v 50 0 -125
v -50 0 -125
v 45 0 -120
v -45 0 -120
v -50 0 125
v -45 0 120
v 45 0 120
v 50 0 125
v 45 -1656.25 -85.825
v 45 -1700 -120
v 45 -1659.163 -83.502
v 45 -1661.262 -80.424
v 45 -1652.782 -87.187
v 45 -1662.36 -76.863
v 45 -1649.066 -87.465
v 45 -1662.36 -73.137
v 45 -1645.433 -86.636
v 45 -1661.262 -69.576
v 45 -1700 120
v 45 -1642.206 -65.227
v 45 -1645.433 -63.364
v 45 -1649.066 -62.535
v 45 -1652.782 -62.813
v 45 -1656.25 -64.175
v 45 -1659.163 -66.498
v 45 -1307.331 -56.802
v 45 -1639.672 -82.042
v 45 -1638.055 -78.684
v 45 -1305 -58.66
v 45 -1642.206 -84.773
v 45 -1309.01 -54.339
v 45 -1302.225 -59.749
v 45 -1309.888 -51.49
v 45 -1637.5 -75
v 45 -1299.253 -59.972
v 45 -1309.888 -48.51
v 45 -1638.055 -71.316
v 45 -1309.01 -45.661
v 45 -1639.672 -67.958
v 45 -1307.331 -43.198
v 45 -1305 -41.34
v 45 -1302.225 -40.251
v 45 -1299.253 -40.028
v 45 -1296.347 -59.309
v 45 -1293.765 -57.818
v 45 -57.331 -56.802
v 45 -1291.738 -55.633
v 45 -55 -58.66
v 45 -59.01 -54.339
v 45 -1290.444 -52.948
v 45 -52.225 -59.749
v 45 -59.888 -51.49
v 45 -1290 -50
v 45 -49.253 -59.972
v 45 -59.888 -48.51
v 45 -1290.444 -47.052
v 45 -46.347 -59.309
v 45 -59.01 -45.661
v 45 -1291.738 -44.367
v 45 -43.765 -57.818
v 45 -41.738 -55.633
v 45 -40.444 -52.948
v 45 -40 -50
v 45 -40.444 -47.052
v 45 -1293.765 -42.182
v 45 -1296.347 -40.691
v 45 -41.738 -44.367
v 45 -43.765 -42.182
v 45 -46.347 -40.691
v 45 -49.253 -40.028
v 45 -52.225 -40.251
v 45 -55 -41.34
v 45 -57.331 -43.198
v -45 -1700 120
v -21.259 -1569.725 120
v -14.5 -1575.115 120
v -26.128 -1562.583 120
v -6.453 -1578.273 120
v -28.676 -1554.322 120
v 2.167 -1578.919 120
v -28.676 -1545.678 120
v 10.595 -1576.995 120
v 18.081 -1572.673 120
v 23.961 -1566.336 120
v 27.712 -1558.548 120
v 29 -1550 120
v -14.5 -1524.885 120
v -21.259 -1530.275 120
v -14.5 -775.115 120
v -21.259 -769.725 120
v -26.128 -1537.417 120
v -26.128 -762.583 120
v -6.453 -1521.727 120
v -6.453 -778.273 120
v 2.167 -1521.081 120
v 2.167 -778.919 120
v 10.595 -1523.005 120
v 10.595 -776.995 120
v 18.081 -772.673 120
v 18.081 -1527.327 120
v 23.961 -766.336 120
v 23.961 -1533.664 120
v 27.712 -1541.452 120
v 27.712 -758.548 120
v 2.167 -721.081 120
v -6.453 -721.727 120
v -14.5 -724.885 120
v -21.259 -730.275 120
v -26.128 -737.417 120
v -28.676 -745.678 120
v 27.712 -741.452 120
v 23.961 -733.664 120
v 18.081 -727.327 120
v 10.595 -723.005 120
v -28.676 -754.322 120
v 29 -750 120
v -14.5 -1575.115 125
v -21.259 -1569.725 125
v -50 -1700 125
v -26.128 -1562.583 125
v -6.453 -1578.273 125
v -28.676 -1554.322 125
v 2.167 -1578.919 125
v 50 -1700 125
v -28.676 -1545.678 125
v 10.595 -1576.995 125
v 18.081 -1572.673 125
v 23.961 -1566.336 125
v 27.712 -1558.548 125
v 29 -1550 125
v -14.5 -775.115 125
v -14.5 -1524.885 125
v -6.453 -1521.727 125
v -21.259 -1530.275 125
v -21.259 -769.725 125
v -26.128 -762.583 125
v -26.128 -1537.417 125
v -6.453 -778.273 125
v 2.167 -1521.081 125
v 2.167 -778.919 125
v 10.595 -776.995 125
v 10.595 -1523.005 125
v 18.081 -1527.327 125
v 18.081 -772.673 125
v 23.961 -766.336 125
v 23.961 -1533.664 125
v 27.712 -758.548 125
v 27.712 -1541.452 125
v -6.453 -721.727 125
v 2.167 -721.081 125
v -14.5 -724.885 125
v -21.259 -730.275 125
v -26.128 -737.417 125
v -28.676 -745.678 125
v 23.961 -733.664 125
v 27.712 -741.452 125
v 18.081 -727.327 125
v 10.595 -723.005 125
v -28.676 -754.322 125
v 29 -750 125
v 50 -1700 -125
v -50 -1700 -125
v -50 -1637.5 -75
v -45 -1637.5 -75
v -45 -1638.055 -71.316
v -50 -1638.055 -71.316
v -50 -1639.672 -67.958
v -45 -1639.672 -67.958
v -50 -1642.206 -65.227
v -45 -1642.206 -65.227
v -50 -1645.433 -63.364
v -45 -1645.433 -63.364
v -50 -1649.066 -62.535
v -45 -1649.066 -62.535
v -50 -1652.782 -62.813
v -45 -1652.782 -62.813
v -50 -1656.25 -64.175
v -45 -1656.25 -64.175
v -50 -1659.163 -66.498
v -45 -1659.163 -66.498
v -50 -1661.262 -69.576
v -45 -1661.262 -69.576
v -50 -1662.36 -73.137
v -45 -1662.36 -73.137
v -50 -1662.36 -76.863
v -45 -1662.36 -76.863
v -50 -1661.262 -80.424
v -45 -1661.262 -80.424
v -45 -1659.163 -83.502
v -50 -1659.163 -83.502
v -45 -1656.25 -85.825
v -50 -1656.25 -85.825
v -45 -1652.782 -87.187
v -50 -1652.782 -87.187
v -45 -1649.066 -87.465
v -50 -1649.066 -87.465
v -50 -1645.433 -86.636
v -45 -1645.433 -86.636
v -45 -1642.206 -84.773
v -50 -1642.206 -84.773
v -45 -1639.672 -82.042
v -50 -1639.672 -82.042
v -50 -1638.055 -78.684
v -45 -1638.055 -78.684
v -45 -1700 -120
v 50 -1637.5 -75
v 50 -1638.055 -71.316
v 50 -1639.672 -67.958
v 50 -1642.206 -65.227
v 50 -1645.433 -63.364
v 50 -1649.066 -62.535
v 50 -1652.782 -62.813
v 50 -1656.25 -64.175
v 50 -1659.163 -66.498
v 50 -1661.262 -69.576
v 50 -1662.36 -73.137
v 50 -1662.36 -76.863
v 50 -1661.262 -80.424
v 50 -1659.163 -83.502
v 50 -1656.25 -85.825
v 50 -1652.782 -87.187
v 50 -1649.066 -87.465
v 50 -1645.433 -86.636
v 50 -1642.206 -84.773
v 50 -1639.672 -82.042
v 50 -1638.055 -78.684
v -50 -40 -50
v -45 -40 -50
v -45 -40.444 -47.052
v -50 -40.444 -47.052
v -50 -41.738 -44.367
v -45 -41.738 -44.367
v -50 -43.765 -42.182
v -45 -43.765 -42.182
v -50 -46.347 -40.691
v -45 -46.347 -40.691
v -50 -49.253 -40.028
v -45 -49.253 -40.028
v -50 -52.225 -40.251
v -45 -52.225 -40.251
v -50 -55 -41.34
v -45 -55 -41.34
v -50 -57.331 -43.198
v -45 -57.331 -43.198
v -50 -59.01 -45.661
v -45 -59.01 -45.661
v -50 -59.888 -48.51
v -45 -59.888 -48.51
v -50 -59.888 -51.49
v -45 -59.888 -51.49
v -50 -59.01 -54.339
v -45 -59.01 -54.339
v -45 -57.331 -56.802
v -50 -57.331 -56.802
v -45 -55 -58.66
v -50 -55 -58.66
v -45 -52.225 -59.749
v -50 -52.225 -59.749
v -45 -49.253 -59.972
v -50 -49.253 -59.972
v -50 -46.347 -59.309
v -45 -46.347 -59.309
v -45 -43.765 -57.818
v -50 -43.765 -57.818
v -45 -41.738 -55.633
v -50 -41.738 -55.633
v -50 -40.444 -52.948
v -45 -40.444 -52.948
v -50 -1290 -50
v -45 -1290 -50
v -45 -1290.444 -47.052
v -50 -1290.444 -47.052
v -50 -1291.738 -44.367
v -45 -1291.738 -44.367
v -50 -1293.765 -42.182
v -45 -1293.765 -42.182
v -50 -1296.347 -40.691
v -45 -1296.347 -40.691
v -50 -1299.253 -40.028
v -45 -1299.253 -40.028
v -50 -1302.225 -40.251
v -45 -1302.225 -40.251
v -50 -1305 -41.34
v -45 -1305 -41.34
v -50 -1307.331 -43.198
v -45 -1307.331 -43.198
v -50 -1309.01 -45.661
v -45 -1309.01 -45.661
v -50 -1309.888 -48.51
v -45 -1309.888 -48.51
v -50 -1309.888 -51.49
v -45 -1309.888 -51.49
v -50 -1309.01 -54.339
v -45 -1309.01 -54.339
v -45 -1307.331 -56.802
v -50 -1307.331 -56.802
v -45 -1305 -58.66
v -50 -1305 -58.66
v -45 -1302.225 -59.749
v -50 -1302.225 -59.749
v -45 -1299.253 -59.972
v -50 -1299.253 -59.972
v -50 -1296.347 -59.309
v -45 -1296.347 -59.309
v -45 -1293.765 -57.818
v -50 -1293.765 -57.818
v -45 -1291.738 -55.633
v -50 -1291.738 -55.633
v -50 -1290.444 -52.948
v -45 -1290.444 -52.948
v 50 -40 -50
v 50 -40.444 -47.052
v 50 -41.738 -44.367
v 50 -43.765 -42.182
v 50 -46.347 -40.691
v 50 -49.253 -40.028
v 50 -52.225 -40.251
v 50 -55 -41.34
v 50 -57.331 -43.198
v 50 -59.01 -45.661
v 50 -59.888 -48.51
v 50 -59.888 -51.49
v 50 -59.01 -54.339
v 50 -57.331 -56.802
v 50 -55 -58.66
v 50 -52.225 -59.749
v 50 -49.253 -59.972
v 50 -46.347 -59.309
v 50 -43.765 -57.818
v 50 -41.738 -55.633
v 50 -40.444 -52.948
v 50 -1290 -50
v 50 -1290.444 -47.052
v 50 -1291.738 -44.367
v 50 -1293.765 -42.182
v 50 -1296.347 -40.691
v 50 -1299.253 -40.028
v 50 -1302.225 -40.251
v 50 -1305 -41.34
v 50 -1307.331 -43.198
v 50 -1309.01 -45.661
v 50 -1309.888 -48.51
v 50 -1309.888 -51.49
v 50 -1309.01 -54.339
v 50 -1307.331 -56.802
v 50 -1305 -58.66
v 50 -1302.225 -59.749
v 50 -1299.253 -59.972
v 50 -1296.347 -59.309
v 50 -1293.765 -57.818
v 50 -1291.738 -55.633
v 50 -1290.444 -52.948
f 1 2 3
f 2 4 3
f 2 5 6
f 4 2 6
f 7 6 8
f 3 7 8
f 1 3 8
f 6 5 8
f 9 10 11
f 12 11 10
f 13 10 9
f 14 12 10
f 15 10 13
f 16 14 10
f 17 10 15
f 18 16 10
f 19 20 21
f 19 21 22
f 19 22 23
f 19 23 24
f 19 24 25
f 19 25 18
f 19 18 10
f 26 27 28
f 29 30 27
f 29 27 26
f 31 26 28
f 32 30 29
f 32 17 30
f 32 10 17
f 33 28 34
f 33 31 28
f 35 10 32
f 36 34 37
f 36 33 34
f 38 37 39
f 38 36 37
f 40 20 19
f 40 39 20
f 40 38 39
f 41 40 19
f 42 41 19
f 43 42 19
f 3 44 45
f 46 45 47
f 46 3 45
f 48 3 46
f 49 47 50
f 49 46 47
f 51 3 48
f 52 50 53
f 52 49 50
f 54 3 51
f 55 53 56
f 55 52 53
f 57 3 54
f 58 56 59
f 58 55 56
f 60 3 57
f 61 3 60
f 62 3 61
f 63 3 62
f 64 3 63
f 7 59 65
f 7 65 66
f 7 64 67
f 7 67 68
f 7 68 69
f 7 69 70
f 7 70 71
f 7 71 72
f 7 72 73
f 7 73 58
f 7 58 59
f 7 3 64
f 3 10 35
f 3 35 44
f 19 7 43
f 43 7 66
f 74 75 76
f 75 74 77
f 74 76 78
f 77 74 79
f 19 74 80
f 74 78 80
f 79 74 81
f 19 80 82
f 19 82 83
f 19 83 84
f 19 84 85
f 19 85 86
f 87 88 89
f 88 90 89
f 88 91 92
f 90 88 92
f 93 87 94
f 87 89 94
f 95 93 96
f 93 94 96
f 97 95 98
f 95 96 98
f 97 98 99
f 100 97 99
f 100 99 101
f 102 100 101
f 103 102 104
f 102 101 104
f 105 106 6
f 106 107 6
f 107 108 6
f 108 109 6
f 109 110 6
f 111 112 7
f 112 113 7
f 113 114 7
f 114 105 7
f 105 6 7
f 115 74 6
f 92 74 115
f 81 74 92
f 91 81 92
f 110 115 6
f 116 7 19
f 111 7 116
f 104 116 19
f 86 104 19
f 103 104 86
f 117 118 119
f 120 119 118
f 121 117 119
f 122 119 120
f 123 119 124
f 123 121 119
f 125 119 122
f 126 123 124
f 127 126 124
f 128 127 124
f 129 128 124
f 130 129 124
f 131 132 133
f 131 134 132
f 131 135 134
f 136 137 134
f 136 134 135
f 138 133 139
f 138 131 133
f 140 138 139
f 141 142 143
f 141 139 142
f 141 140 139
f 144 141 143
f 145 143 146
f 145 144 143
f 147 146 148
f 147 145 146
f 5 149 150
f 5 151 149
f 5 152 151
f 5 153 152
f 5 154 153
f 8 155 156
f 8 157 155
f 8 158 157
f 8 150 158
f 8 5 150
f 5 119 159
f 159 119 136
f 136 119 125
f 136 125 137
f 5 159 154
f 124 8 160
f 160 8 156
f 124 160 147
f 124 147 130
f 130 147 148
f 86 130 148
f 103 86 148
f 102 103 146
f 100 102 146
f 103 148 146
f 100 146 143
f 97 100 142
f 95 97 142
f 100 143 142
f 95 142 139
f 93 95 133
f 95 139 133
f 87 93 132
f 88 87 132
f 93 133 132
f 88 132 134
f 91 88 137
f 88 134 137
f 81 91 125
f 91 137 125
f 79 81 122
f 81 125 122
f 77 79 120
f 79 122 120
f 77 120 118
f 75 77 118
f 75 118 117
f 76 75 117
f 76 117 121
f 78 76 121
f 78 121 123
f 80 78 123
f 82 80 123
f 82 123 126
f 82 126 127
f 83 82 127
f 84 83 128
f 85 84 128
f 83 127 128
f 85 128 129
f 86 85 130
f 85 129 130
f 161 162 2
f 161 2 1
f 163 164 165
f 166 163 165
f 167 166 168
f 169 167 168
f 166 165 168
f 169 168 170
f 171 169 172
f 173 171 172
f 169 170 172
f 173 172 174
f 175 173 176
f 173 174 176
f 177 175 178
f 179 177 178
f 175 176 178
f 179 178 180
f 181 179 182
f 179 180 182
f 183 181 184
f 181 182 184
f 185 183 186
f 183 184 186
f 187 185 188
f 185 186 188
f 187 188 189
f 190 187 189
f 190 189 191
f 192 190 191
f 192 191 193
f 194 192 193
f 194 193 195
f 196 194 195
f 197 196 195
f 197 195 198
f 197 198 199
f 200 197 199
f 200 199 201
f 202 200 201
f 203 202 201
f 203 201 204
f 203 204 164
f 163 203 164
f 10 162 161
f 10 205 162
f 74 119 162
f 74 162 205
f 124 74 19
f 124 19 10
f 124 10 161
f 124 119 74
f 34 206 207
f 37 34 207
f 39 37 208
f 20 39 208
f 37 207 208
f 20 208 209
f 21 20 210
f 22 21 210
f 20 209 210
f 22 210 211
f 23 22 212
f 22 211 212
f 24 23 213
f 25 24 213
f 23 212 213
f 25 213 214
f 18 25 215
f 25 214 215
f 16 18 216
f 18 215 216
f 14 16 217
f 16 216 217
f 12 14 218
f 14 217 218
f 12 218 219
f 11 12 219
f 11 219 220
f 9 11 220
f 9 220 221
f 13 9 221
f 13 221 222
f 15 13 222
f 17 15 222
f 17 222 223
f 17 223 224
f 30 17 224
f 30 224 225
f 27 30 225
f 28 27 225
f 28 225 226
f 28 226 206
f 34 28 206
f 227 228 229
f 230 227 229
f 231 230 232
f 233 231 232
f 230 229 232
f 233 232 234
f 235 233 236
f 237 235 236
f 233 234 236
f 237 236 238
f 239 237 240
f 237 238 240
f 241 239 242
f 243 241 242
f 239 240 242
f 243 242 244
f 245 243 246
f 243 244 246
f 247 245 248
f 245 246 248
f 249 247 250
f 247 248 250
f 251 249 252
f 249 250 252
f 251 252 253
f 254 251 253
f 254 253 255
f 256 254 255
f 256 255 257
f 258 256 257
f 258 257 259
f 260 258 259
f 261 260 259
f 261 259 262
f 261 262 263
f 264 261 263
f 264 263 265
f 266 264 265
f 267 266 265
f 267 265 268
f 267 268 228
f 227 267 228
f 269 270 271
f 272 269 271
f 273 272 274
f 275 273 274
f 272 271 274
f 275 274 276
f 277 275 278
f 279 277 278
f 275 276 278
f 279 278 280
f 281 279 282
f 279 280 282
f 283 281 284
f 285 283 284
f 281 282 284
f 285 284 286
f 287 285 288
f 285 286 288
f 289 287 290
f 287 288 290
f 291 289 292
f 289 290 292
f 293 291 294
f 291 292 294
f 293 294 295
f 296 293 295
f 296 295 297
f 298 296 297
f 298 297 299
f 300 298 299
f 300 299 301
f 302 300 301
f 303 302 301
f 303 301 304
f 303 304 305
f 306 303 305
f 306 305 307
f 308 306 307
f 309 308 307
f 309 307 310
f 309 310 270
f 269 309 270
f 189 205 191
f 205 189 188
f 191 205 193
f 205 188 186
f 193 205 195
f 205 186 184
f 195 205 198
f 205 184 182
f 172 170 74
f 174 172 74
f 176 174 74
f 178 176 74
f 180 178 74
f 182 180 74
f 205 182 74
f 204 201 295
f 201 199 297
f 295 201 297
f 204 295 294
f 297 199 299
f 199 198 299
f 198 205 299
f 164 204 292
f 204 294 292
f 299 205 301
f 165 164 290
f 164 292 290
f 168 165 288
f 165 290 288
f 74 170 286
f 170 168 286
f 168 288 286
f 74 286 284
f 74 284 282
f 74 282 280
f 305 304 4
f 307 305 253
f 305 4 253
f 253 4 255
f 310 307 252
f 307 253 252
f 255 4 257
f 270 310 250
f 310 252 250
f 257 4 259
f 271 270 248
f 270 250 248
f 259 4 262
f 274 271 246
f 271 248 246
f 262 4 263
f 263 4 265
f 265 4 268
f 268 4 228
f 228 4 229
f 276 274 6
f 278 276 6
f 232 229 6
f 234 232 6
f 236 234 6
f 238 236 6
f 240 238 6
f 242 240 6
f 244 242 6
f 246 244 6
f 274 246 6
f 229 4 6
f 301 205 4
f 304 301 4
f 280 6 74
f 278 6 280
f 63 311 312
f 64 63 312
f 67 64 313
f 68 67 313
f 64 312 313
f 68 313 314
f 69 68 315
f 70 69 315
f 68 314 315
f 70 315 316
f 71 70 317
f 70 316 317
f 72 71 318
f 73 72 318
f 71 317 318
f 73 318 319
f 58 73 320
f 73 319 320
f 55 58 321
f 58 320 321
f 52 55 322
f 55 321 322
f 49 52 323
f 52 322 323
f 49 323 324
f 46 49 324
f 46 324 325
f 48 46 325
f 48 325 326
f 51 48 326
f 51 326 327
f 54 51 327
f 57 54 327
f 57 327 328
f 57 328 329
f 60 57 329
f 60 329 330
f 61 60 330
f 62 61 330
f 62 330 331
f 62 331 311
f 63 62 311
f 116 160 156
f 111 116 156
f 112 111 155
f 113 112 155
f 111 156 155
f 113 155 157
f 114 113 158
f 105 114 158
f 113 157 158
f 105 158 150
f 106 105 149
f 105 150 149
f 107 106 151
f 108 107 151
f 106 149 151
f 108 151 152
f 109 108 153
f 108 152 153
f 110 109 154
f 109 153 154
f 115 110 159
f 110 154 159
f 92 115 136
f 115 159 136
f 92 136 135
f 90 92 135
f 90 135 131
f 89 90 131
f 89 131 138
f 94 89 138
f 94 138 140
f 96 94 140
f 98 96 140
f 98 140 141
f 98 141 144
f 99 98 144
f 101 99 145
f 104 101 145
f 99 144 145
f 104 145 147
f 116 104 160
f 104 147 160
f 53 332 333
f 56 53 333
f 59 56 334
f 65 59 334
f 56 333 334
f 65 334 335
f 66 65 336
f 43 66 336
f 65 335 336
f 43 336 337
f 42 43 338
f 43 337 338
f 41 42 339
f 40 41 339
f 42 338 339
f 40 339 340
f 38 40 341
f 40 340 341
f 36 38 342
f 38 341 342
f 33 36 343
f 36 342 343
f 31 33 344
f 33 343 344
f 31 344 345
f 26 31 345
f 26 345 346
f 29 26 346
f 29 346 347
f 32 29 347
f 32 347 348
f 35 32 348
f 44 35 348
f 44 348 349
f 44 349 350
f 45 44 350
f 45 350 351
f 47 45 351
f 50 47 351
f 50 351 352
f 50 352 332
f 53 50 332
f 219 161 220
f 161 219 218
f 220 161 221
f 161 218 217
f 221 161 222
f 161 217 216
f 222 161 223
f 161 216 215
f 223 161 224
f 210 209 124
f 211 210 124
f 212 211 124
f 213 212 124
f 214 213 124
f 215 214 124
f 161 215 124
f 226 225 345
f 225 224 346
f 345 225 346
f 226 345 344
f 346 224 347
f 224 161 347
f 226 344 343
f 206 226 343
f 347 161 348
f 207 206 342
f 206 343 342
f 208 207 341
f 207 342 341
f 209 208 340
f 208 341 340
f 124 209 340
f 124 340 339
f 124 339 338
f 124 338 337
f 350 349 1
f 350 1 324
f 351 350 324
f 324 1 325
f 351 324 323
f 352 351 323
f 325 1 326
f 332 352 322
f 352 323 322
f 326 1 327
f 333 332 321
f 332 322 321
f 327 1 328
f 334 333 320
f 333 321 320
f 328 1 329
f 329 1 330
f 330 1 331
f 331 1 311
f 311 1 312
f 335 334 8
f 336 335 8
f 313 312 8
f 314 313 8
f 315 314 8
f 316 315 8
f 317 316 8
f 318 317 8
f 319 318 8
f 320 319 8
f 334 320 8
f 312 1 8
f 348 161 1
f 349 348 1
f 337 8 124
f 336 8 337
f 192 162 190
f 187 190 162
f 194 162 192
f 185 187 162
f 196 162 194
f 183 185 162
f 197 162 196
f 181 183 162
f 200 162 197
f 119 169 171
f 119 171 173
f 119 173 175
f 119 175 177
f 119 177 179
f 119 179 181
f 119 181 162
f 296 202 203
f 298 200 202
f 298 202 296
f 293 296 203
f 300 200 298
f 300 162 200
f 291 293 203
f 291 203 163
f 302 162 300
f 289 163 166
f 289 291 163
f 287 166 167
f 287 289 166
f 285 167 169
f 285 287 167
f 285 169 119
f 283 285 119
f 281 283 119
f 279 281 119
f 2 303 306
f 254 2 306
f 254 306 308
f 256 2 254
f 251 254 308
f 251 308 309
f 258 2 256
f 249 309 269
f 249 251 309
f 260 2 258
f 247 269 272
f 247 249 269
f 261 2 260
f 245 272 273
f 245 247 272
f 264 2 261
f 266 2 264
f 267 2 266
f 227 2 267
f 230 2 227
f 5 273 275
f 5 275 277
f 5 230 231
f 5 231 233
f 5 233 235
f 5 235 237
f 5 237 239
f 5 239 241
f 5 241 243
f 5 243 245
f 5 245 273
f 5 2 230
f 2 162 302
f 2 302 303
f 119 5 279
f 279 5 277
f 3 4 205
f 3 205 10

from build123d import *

# Parameters (mm, degrees)
F0_W      = 100
F0_H      = 250
F0_W_2    = 90
F0_H_2    = 240
F1_DEPTH  = 1700
F2_R      = 10
F3_DEPTH  = 100.001
F4_R      = 10
F5_DEPTH  = 100.001
F6_R      = 29
F7_R      = 29
F8_DEPTH  = 5
F9_R      = 12.5
F10_DEPTH = 100.001


# Not quite as in the source:
# - a feature names something its author has since deleted; it is built from what else it names


with BuildPart() as f1:
    # F0 (on Front) → F1 (new body)
    with BuildSketch(Plane.XZ):
        Rectangle(F0_W, F0_H)
        Rectangle(F0_W_2, F0_H_2, mode=Mode.SUBTRACT)
    extrude(amount=F1_DEPTH)

    # F2 (on face) → F3 (cut, through all)
    with BuildSketch(Plane.YZ.offset(50)):
        with Locations((-1300, -50)):
            Circle(F2_R)
    extrude(amount=-F3_DEPTH, mode=Mode.SUBTRACT)

    # F4 (on face) → F5 (cut, through all)
    with BuildSketch(Plane.YZ.offset(50)):
        with Locations((-50, -50)):
            Circle(F4_R)
    extrude(amount=-F5_DEPTH, mode=Mode.SUBTRACT)

    # F6 (on face) + F7 (on face) → F8 (cut, through all)
    with BuildSketch(Plane.XY.offset(125)):
        with Locations((0, -1550)):
            Circle(F6_R)
    with BuildSketch(Plane.XY.offset(125)):
        with Locations((0, -750)):
            Circle(F7_R)
    extrude(amount=-F8_DEPTH, mode=Mode.SUBTRACT)

    # F9 (on face) → F10 (cut, through all)
    with BuildSketch(Plane.YZ.offset(50)):
        with Locations((-1650, -75)):
            Circle(F9_R)
    extrude(amount=-F10_DEPTH, mode=Mode.SUBTRACT)


solid = f1.part
